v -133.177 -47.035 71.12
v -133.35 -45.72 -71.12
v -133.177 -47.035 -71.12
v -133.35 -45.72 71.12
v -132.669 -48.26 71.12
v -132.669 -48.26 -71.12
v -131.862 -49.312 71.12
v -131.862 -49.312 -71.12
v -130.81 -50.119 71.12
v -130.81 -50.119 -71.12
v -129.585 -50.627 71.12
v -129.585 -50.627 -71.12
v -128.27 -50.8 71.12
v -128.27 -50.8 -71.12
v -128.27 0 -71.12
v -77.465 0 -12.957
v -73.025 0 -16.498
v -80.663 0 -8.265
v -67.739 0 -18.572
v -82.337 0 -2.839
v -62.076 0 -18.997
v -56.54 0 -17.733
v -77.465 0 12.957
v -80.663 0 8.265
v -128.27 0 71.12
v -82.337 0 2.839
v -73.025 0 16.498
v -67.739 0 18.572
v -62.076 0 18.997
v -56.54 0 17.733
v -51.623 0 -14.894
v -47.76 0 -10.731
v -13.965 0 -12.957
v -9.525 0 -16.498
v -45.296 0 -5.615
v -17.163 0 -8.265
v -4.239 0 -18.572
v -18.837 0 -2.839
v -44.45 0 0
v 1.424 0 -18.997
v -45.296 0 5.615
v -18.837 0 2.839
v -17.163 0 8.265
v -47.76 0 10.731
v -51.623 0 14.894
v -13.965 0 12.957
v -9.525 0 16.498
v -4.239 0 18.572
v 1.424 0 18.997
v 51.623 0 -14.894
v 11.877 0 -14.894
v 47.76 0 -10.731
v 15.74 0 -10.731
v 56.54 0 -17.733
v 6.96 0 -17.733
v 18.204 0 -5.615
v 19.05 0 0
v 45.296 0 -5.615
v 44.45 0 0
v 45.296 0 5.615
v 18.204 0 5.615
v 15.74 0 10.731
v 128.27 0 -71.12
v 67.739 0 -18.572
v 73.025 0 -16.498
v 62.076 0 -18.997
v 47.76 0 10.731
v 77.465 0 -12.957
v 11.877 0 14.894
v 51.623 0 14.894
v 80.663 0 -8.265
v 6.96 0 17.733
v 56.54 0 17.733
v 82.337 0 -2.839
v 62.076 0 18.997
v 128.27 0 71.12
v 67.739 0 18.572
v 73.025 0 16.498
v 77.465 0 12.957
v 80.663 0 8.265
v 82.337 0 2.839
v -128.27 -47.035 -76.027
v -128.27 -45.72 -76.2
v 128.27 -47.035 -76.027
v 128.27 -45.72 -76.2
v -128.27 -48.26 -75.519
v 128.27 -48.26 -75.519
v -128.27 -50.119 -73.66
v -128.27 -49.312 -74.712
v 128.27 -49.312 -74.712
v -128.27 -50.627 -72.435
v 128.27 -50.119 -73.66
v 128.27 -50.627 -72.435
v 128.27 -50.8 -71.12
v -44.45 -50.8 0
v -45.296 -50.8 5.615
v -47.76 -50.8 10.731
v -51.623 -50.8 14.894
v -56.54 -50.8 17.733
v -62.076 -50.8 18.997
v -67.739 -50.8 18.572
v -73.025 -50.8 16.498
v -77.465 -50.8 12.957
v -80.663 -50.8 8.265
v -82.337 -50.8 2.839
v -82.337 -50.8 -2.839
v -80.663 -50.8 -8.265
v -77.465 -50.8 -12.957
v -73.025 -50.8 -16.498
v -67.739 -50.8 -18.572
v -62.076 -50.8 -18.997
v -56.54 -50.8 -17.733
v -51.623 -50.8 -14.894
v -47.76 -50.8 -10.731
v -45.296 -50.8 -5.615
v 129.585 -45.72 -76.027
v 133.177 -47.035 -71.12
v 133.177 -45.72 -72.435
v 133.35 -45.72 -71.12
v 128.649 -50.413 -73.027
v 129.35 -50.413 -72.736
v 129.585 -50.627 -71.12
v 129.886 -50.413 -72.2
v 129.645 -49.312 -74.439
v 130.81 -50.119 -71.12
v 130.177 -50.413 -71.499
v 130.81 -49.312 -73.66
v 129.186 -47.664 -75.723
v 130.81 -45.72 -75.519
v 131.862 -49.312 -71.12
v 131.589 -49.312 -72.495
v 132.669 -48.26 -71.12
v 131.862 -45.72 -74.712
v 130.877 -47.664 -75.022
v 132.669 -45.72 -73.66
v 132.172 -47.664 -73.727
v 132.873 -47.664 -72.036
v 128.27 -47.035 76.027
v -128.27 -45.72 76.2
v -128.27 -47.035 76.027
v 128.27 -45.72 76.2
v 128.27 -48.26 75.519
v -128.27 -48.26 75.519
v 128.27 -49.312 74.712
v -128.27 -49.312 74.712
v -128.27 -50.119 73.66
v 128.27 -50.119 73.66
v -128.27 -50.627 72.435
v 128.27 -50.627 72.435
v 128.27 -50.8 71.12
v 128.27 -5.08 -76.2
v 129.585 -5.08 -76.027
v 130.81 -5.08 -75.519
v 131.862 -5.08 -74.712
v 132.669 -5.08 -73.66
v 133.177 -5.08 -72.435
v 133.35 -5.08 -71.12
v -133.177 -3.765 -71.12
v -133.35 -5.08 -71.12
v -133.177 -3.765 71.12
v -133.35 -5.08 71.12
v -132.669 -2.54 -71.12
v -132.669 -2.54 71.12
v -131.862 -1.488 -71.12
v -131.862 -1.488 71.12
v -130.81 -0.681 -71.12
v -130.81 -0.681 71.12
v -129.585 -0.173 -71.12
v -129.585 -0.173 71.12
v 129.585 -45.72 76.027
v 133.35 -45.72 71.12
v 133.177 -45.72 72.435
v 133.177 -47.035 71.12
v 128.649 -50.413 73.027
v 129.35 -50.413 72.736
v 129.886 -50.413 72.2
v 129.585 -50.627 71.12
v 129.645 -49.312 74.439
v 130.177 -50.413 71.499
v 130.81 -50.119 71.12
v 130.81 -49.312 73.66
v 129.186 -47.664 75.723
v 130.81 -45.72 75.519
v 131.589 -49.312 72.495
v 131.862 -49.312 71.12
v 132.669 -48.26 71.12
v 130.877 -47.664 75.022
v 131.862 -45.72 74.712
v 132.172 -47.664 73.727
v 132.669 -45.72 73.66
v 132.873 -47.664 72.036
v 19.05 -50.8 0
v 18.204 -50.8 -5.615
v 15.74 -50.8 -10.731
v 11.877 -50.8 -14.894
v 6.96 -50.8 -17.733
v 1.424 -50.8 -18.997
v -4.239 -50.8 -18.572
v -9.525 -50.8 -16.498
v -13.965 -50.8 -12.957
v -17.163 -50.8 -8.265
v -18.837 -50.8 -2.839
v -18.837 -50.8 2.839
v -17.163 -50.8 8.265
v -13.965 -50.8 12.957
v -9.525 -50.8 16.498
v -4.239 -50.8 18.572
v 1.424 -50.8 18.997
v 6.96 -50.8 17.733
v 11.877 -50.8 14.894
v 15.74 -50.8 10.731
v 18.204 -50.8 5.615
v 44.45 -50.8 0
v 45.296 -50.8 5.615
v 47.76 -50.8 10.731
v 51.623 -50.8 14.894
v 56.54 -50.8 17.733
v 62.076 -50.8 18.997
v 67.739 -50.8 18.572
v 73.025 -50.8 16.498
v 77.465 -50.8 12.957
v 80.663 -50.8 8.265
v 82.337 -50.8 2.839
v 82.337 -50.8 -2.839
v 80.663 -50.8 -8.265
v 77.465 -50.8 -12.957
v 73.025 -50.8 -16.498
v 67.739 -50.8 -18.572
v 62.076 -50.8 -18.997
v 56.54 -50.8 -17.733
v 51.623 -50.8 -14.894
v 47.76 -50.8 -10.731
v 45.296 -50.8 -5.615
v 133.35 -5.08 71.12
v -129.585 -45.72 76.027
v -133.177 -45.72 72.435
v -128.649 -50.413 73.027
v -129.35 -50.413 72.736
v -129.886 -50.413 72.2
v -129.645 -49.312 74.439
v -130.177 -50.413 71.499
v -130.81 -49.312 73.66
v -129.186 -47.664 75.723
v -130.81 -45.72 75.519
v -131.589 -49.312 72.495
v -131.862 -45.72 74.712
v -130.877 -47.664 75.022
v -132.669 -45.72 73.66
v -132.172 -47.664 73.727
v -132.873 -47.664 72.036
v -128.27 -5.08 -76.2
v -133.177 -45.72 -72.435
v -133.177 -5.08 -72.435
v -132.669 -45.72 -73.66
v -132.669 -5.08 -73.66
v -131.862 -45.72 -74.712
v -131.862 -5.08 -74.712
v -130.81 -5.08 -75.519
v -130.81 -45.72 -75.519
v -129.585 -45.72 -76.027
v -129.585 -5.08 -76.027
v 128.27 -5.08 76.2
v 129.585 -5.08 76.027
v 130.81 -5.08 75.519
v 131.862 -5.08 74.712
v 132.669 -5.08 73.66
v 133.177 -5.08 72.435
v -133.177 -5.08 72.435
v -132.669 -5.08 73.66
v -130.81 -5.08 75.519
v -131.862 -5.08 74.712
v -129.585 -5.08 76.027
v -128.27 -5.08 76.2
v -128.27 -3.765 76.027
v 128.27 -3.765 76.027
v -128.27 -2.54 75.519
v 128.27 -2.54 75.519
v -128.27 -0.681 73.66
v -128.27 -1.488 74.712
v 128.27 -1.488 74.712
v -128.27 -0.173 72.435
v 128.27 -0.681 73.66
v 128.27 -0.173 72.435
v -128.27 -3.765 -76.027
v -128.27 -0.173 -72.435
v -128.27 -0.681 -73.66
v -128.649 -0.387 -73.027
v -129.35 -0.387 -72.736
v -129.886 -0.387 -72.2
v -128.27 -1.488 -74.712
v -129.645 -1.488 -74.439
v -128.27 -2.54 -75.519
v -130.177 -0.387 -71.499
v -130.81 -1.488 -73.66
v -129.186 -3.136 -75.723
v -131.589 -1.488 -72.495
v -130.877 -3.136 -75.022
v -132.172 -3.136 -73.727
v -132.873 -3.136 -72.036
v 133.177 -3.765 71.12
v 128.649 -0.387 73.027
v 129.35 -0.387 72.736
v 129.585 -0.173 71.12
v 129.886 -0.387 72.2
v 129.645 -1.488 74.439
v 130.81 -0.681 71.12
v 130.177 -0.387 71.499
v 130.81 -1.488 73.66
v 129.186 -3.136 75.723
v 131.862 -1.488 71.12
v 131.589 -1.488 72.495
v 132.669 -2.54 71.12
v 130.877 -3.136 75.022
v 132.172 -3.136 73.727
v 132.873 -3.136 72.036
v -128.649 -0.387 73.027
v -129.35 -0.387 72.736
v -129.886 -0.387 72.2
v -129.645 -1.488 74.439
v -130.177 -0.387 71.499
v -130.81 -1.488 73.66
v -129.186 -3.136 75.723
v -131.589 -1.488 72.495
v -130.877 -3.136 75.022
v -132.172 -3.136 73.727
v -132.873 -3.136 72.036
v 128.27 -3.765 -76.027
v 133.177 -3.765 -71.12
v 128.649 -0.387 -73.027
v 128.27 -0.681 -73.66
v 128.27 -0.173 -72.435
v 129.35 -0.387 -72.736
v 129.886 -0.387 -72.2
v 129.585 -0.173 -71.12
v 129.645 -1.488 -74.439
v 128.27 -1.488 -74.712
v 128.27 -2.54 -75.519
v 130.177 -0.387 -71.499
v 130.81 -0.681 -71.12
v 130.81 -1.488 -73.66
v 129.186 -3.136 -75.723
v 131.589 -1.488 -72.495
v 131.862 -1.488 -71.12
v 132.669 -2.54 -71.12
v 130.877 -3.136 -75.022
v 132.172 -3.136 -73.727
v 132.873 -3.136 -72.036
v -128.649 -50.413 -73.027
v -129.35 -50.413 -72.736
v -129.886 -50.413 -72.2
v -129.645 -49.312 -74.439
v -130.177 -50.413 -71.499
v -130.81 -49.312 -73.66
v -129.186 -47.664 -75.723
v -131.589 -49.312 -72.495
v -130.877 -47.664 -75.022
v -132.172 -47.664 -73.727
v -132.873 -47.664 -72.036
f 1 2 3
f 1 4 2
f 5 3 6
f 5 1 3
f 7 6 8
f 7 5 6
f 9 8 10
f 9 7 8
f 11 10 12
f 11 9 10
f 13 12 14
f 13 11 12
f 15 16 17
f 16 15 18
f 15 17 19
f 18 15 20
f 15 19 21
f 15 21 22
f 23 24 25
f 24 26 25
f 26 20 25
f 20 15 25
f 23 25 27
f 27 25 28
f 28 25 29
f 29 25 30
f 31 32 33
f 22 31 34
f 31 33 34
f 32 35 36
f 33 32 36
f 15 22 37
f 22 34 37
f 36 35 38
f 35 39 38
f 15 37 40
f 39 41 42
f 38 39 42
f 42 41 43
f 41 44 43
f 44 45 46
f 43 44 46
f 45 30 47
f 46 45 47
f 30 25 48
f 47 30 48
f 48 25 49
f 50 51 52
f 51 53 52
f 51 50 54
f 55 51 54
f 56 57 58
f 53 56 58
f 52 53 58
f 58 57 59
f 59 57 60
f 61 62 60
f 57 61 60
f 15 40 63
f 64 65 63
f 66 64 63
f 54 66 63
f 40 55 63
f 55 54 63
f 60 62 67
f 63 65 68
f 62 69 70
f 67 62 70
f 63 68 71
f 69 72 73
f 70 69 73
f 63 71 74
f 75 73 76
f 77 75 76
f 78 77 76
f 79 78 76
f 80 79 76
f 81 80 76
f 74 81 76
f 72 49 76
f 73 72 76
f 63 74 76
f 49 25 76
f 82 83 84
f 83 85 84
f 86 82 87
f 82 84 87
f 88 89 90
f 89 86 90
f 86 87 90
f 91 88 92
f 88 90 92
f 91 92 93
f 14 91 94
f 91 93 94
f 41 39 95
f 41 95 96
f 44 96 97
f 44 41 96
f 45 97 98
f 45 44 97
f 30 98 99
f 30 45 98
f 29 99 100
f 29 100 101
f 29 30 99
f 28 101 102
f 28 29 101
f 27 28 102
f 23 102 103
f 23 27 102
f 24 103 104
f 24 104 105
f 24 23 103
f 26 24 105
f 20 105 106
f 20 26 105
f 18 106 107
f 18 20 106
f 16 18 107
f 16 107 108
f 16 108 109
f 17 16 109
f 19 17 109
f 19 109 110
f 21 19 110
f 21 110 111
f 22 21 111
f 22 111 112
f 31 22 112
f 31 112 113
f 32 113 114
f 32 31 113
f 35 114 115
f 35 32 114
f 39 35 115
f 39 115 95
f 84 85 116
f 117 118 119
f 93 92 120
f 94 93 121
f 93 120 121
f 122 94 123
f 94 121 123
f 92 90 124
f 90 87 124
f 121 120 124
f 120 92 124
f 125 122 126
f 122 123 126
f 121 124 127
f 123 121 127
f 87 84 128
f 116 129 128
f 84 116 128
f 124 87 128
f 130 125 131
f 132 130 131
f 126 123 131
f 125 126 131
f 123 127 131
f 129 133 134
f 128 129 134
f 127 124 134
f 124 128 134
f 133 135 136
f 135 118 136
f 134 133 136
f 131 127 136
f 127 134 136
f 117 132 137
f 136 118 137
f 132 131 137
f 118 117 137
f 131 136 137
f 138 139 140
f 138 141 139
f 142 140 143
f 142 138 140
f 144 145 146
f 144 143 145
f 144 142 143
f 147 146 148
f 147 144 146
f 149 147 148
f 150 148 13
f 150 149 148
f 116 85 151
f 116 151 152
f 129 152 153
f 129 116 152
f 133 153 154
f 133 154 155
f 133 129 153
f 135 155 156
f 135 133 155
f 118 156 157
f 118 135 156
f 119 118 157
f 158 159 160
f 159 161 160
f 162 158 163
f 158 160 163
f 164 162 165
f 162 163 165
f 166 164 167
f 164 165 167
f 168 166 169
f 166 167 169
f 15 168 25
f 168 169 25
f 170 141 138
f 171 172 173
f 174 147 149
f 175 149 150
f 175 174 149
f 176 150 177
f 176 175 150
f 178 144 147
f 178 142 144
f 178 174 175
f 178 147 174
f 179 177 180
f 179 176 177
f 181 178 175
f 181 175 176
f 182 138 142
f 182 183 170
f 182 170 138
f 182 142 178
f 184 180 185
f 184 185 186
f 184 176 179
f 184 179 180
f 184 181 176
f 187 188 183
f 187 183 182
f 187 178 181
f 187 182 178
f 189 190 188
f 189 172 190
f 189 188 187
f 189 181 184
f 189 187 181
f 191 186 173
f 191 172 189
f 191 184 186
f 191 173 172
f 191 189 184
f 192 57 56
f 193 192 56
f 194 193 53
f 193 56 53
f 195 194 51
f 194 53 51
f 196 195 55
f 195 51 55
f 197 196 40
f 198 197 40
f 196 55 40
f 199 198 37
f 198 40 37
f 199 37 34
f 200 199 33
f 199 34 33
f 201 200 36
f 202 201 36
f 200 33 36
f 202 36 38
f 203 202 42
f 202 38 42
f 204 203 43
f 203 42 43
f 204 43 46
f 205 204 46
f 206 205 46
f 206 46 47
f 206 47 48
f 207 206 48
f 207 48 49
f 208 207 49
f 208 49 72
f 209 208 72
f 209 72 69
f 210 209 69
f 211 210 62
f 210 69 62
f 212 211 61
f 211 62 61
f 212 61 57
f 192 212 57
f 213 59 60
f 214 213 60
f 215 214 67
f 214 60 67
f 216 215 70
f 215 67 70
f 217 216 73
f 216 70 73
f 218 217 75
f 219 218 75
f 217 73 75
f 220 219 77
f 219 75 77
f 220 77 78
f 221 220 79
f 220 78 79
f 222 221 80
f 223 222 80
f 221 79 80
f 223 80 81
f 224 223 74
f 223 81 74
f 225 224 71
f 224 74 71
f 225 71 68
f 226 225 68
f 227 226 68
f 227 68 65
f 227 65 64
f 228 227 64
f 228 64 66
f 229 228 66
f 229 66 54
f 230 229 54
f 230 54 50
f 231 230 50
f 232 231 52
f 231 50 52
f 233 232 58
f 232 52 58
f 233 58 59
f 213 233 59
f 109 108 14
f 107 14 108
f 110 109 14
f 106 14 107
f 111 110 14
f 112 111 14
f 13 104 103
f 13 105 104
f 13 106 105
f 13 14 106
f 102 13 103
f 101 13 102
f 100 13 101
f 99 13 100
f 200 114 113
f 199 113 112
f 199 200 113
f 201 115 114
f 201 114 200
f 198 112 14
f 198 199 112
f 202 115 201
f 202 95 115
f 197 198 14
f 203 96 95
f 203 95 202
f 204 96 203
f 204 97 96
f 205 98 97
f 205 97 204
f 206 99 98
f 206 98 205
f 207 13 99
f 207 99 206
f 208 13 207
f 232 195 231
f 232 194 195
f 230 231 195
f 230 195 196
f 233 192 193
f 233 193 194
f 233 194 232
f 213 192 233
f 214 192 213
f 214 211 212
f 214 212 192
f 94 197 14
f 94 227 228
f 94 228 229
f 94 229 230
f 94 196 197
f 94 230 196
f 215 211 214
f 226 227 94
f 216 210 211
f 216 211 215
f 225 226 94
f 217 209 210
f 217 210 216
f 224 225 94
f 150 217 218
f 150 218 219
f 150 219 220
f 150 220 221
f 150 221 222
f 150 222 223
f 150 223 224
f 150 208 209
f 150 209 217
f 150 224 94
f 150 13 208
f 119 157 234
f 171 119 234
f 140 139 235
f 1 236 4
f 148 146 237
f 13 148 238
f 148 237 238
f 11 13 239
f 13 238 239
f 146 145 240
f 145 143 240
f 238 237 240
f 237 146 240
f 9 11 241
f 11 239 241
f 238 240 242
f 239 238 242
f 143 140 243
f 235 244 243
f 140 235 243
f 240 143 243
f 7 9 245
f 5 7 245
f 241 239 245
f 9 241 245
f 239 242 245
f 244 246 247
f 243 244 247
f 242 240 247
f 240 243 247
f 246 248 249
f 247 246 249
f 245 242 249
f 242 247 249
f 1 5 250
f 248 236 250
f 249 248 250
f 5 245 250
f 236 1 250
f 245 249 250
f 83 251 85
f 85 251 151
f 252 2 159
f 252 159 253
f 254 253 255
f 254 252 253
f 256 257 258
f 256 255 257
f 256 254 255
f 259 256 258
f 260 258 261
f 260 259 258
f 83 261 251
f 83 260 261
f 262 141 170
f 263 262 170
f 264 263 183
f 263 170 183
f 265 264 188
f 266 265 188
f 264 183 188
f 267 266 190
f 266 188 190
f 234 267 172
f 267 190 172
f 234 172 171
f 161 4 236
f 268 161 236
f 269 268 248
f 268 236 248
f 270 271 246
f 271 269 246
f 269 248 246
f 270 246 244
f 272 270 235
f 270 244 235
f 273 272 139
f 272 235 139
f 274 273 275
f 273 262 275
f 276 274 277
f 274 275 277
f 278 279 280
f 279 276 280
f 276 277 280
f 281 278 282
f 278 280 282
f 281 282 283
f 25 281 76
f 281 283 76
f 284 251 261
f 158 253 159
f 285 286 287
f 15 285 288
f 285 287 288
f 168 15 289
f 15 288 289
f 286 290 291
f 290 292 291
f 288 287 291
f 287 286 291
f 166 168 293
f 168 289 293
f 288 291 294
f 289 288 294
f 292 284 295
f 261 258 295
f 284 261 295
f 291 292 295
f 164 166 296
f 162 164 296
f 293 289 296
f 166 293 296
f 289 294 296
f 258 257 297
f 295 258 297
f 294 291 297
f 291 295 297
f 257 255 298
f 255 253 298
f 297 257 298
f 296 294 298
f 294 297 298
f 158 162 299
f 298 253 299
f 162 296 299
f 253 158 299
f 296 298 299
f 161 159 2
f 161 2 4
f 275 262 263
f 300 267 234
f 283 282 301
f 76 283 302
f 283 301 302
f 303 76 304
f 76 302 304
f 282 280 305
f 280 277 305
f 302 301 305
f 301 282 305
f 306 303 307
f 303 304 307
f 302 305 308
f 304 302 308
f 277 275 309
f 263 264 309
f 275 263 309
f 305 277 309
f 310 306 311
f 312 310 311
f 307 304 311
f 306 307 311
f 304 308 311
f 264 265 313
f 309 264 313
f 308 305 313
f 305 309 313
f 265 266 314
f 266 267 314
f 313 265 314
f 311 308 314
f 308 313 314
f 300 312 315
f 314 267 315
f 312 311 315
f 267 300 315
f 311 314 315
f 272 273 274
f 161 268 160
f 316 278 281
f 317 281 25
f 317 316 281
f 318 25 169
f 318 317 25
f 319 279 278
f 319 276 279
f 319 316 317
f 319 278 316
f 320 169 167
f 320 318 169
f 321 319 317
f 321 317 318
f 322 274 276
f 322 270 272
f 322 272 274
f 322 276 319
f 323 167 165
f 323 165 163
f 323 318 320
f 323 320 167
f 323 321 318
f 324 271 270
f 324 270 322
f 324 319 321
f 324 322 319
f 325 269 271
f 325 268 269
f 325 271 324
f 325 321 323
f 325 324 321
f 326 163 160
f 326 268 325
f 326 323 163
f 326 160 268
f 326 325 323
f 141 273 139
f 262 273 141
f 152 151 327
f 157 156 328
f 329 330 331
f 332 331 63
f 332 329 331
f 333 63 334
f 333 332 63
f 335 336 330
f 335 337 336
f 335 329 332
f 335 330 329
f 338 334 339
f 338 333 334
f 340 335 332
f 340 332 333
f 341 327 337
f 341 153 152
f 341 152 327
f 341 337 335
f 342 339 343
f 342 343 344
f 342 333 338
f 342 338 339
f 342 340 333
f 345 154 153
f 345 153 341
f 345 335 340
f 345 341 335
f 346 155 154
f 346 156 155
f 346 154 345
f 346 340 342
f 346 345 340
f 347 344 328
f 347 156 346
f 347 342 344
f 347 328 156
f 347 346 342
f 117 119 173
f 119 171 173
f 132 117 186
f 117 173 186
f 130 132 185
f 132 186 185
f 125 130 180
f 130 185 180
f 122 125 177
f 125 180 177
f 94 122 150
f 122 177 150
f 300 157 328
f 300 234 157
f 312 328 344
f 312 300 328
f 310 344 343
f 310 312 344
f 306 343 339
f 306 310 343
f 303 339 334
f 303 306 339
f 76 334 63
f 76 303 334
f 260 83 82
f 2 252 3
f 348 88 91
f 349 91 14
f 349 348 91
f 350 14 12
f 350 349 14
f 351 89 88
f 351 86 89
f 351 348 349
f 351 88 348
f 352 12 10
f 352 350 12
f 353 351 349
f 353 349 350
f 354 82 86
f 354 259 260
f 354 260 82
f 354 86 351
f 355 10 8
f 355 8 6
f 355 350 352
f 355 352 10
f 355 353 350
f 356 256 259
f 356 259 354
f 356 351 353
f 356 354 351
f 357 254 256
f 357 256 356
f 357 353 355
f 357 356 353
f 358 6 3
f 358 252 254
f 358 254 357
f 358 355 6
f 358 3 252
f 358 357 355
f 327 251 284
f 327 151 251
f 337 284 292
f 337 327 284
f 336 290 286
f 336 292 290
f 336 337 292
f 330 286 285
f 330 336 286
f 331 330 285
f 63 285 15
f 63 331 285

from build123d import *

# Parameters (mm, degrees)
F0_W     = 266.7
F0_H     = 152.4
F0_R     = 19.05
F1_DEPTH = 50.8
F2_R     = 5.08


with BuildPart() as f1:
    # F0 (on Front) → F1 (new body)
    with BuildSketch(Plane.XZ):
        with Locations((-63.5, 0)):
            Circle(F0_R)
        with BuildLine():
            ThreePointArc((82.55, 0), (63.5, 19.05), (44.45, 0))
            ThreePointArc((44.45, 0), (63.5, -19.05), (82.55, 0))
        make_face()
        Rectangle(F0_W, F0_H)
        with Locations((-63.5, 0)):
            Circle(F0_R, mode=Mode.SUBTRACT)
        with BuildLine():
            ThreePointArc((-19.05, 0), (0, 19.05), (19.05, 0))
            ThreePointArc((19.05, 0), (0, -19.05), (-19.05, 0))
        make_face(mode=Mode.SUBTRACT)
        with BuildLine():
            ThreePointArc((82.55, 0), (63.5, -19.05), (44.45, 0))
            ThreePointArc((44.45, 0), (63.5, 19.05), (82.55, 0))
        make_face(mode=Mode.SUBTRACT)
    extrude(amount=F1_DEPTH)

    # F2
    f2_edges = [f1.edges().sort_by_distance(p)[0] for p in [
        (-133.35, -25.4, -76.2),
        (133.35, -25.4, -76.2),
        (0, 0, -76.2),
        (0, -50.8, -76.2),
        (133.35, -25.4, 76.2),
        (-133.35, -25.4, 76.2),
        (0, 0, 76.2),
        (0, -50.8, 76.2),
        (-133.35, 0, 0),
        (-133.35, -50.8, 0),
        (133.35, 0, 0),
        (133.35, -50.8, 0),
    ]]
    fillet(f2_edges, radius=F2_R)


solid = f1.part
